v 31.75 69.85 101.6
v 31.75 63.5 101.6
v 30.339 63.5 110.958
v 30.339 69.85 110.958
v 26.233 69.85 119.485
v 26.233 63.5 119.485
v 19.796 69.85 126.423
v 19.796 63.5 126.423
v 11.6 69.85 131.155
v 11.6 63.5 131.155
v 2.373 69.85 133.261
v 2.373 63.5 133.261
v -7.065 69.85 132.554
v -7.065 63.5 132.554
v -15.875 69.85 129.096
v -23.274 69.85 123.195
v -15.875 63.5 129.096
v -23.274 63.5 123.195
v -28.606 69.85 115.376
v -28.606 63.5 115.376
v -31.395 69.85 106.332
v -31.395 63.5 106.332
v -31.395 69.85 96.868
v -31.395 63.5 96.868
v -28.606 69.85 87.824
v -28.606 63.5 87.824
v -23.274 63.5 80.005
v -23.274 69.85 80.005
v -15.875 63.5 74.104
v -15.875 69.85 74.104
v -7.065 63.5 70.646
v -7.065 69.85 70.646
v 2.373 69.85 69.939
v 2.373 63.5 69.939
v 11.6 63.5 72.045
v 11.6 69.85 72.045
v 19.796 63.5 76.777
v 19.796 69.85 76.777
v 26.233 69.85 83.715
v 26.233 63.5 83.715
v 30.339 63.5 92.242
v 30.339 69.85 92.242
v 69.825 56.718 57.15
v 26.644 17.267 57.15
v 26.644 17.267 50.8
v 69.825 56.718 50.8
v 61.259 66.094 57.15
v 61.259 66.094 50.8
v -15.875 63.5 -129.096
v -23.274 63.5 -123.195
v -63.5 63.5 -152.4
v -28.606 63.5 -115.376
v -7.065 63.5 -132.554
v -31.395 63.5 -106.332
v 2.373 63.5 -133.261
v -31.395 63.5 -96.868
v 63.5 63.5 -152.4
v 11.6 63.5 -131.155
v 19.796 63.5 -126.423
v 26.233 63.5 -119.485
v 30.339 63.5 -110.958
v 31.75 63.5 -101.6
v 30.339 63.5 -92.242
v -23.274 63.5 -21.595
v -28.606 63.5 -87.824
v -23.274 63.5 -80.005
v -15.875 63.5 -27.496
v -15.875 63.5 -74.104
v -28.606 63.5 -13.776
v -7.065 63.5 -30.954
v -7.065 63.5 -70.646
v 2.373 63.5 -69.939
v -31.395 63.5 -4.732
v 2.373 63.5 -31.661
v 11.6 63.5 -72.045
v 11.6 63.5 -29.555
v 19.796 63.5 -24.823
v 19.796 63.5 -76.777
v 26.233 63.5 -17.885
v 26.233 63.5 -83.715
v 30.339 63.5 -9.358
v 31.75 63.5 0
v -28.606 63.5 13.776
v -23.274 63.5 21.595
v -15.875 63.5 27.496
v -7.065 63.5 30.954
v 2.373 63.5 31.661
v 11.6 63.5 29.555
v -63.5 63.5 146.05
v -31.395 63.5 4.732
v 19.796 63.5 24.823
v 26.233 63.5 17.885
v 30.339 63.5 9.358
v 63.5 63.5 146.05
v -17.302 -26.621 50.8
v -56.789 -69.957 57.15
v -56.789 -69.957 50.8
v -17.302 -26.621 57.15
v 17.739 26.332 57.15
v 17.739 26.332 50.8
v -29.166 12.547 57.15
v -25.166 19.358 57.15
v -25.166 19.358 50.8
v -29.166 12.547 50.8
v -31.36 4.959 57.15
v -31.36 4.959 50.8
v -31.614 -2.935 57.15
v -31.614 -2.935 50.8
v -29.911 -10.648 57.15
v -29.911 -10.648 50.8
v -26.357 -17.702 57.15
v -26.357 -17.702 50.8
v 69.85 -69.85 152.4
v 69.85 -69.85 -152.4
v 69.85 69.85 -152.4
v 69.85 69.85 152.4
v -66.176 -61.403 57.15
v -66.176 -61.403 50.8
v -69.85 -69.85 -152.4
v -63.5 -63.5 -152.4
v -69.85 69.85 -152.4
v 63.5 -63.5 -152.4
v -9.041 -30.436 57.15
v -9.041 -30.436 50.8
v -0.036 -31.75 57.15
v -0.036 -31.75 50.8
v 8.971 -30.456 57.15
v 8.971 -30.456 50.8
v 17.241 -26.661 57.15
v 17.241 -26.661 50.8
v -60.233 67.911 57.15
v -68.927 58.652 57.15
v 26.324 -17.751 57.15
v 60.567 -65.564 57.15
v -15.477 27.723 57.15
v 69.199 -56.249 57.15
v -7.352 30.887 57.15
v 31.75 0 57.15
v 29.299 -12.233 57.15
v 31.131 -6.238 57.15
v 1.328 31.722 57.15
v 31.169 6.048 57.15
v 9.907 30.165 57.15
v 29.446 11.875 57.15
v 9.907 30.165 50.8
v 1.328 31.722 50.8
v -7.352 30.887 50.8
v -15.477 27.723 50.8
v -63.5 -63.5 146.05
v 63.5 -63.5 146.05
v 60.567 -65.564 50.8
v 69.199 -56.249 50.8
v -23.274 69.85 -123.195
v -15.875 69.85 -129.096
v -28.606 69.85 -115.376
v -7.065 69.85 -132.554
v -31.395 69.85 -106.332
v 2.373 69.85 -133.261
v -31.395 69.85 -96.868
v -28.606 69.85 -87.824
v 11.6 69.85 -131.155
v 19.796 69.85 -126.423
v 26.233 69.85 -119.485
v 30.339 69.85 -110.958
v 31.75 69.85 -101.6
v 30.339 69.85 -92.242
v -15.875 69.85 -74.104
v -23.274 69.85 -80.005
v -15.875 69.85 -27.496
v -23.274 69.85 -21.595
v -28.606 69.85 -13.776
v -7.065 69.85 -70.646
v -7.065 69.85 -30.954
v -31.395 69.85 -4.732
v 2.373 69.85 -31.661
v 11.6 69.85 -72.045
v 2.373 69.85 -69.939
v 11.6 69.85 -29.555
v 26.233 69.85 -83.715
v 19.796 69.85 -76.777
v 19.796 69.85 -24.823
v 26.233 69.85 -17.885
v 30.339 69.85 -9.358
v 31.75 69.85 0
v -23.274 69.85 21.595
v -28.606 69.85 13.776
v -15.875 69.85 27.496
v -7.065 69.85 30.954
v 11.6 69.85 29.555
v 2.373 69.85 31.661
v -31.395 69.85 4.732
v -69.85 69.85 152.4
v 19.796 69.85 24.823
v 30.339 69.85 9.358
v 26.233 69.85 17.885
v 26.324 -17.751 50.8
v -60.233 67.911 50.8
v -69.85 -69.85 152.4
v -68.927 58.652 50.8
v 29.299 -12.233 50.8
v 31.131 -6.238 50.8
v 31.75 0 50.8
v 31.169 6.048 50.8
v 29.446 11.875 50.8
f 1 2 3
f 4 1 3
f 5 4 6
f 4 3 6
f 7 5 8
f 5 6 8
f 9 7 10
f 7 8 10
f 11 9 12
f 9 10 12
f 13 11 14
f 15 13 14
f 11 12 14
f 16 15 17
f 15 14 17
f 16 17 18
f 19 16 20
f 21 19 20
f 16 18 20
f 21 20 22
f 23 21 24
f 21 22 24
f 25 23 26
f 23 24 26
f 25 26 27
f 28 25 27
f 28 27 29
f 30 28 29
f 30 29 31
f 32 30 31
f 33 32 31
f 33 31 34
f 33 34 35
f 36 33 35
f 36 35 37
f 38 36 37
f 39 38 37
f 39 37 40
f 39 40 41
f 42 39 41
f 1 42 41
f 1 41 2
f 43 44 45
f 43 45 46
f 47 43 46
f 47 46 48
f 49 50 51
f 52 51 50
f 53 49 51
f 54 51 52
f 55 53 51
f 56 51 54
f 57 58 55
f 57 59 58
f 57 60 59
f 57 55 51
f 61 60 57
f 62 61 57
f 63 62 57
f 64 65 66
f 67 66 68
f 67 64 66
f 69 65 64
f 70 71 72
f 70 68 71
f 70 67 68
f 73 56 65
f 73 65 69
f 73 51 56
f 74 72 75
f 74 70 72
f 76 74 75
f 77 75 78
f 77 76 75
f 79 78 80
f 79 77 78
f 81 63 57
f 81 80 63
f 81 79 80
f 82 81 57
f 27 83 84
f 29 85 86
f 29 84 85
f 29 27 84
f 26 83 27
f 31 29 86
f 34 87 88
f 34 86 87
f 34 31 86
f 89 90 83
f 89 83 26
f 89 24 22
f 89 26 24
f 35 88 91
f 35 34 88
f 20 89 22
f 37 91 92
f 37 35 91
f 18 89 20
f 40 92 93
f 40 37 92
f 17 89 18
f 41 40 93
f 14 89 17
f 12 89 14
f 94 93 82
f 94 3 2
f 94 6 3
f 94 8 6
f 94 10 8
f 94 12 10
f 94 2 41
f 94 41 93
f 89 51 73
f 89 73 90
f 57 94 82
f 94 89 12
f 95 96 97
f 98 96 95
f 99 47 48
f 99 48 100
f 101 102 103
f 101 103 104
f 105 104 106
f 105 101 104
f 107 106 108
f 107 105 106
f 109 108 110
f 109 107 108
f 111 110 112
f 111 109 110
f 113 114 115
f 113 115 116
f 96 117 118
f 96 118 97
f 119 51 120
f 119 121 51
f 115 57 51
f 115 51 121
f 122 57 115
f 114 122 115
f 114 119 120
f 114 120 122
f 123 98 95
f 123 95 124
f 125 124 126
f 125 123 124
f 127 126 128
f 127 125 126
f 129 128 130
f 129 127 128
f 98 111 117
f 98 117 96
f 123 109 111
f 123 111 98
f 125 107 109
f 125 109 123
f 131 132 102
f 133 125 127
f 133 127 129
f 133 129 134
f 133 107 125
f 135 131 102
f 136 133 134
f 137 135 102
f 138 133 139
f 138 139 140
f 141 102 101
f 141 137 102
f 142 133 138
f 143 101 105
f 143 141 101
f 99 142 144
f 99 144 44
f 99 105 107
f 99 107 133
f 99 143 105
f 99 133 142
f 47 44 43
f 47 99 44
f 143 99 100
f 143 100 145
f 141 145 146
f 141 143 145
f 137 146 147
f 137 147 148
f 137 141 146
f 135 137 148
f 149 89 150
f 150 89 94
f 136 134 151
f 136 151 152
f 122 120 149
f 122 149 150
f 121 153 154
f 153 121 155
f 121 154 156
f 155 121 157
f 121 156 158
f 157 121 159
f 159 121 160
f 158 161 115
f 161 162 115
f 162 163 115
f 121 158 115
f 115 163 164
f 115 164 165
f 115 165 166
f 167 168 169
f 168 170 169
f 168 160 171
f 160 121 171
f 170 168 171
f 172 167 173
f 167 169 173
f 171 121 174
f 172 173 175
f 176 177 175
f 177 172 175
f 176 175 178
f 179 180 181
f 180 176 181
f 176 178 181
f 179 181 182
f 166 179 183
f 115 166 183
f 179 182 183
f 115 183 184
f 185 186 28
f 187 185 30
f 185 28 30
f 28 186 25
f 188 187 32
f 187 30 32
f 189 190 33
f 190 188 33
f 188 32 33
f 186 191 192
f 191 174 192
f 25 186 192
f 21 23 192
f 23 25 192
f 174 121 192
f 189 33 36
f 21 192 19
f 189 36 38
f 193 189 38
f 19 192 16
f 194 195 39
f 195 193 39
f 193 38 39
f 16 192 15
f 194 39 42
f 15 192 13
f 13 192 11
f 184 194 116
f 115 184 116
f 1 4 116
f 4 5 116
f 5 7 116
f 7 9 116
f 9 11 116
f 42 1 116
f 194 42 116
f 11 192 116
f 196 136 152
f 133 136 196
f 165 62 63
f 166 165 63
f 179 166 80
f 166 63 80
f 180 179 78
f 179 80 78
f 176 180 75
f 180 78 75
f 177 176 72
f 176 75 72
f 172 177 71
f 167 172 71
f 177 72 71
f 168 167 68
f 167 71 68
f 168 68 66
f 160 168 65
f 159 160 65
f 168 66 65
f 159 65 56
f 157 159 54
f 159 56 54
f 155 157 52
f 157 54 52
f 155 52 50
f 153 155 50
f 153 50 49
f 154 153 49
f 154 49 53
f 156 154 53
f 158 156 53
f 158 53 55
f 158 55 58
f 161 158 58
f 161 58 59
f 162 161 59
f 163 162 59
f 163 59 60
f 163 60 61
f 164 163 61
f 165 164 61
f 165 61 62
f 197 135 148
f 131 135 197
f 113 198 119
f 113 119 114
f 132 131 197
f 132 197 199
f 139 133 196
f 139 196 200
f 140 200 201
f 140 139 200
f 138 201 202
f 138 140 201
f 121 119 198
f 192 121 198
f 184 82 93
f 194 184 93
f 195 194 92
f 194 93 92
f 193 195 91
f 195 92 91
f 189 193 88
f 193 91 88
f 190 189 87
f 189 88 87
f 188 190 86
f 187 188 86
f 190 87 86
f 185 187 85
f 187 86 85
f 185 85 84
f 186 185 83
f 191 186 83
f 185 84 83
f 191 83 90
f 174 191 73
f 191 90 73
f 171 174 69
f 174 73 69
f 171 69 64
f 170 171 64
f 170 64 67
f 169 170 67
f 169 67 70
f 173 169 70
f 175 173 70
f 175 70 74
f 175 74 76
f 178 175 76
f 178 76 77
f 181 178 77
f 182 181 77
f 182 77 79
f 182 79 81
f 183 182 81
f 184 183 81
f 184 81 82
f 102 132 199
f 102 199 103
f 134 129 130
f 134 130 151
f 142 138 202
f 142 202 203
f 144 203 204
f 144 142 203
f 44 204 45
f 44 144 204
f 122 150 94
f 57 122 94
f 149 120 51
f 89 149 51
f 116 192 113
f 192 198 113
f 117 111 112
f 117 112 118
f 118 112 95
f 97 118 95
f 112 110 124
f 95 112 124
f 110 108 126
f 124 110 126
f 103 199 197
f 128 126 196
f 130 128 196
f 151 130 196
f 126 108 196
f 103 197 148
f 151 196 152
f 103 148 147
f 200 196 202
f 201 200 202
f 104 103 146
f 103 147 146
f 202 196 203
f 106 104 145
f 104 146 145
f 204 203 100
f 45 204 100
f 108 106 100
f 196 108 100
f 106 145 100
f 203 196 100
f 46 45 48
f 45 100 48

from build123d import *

# Parameters (mm, degrees)
F0_W          = 139.7
F0_H          = 304.8
F1_DEPTH      = 69.85
F2_W          = 127
F2_H          = 127
F3_DEPTH      = 152.4
F3_DEPTH_BACK = 146.05
F4_R          = 31.75
F5_DEPTH      = 127
F8_DEPTH      = 6.35


with BuildPart() as f1:
    # F0 (on Front) → F1 (new body, symmetric)
    with BuildSketch(Plane.XZ):
        Rectangle(F0_W, F0_H)
    extrude(amount=F1_DEPTH, both=True)

    # F2 (on Top) → F3 (cut, two sides)
    with BuildSketch(Plane.XY) as f3_sk:
        Rectangle(F2_W, F2_H)
    extrude(amount=-F3_DEPTH, mode=Mode.SUBTRACT)
    extrude(f3_sk.sketch, amount=F3_DEPTH_BACK, mode=Mode.SUBTRACT)

    # F4 (on Front) → F5 (cut)
    with BuildSketch(Plane.XZ):
        Circle(F4_R)
        with Locations((0, 101.6)):
            Circle(F4_R)
        with Locations((0, -101.6)):
            Circle(F4_R)
    extrude(amount=-F5_DEPTH, mode=Mode.SUBTRACT)

    # F10 (on offset) → F11 (revolve, cut)
    with BuildSketch(Plane.XY.offset(44.45)):
        with BuildLine():
            Line((0, -6.35), (0, 0))
            Line((0, 0), (0, 6.35))
            ThreePointArc((0, 6.35), (-6.35, 0), (0, -6.35))
        make_face()
    revolve(axis=Axis((0, -3.175, 44.45), (0, -1, 0)), mode=Mode.SUBTRACT)


with BuildPart() as f8:
    # F7 (on offset) → F8 (new body)
    with BuildSketch(Plane.XY.offset(57.15)):
        with BuildLine():
            ThreePointArc((26.3244952978, -17.7505900554), (30.3633432424, -9.2806188989), (31.75, 0))
            ThreePointArc((31.75, 0), (30.446875694, 9.0027918155), (26.6444717812, 17.2665753264))
            Line((26.6444717812, 17.2665753264), (23.8826018393, 14.7432721863))
            Line((23.8826018393, 14.7432721863), (15.3164268655, 24.1193399291))
            Line((15.3164268655, 24.1193399291), (17.7387810505, 26.3324542502))
            ThreePointArc((17.7387810505, 26.3324542502), (1.3276009662, 31.7222315683), (-15.4765358755, 27.7225420425))
            Line((-15.4765358755, 27.7225420425), (-12.9853863034, 25.485682995))
            Line((-12.9853863034, 25.485682995), (-21.6787576449, 16.227427505))
            Line((-21.6787576449, 16.227427505), (-25.1657139179, 19.3584437133))
            ThreePointArc((-25.1657139179, 19.3584437133), (-31.7336135863, 1.0199356609), (-26.3568722235, -17.7024796736))
            Line((-26.3568722235, -17.7024796736), (-23.4076284828, -14.4657643103))
            Line((-23.4076284828, -14.4657643103), (-14.0201763565, -23.019461907))
            Line((-14.0201763565, -23.019461907), (-17.3021757576, -26.6213676218))
            ThreePointArc((-17.3021757576, -26.6213676218), (-0.0363207978, -31.7499792252), (17.2412228394, -26.6608839877))
            Line((17.2412228394, -26.6608839877), (15.2091812342, -24.836268276))
            Line((15.2091812342, -24.836268276), (23.8411927104, -15.5207769913))
            Line((23.8411927104, -15.5207769913), (26.3244952978, -17.7505900554))
        make_face()
        with BuildLine():
            Line((23.8826018393, 14.7432721863), (26.6444717812, 17.2665753264))
            ThreePointArc((26.6444717812, 17.2665753264), (22.6498526076, 22.2496444208), (17.7387810505, 26.3324542502))
            Line((17.7387810505, 26.3324542502), (15.3164268655, 24.1193399291))
            Line((15.3164268655, 24.1193399291), (23.8826018393, 14.7432721863))
        make_face()
        with BuildLine():
            ThreePointArc((17.7387810505, 26.3324542502), (22.6498526076, 22.2496444208), (26.6444717812, 17.2665753264))
            Line((26.6444717812, 17.2665753264), (69.8253337792, 56.7175295579))
            Line((69.8253337792, 56.7175295579), (61.2591588054, 66.0935973007))
            Line((61.2591588054, 66.0935973007), (17.7387810505, 26.3324542502))
        make_face()
        with BuildLine():
            Line((69.1992311576, -56.2487765521), (26.3244952978, -17.7505900554))
            ThreePointArc((26.3244952978, -17.7505900554), (22.233786985, -22.6654189528), (17.2412228394, -26.6608839877))
            Line((17.2412228394, -26.6608839877), (60.5672196814, -65.5642678368))
            Line((60.5672196814, -65.5642678368), (69.1992311576, -56.2487765521))
        make_face()
        with BuildLine():
            ThreePointArc((17.2412228394, -26.6608839877), (22.233786985, -22.6654189528), (26.3244952978, -17.7505900554))
            Line((26.3244952978, -17.7505900554), (23.8411927104, -15.5207769913))
            Line((23.8411927104, -15.5207769913), (15.2091812342, -24.836268276))
            Line((15.2091812342, -24.836268276), (17.2412228394, -26.6608839877))
        make_face()
        with BuildLine():
            Line((-12.9853863034, 25.485682995), (-15.4765358755, 27.7225420425))
            ThreePointArc((-15.4765358755, 27.7225420425), (-20.7469914031, 24.033827155), (-25.1657139179, 19.3584437133))
            Line((-25.1657139179, 19.3584437133), (-21.6787576449, 16.227427505))
            Line((-21.6787576449, 16.227427505), (-12.9853863034, 25.485682995))
        make_face()
        with BuildLine():
            ThreePointArc((-25.1657139179, 19.3584437133), (-20.7469914031, 24.033827155), (-15.4765358755, 27.7225420425))
            Line((-15.4765358755, 27.7225420425), (-60.2333430192, 67.9106825375))
            Line((-60.2333430192, 67.9106825375), (-68.9267143607, 58.6524270475))
            Line((-68.9267143607, 58.6524270475), (-25.1657139179, 19.3584437133))
        make_face()
        with BuildLine():
            Line((-56.7886643402, -69.9567225384), (-17.3021757576, -26.6213676218))
            ThreePointArc((-17.3021757576, -26.6213676218), (-22.2803671023, -22.6196317784), (-26.3568722235, -17.7024796736))
            Line((-26.3568722235, -17.7024796736), (-66.1761164665, -61.4030249417))
            Line((-66.1761164665, -61.4030249417), (-56.7886643402, -69.9567225384))
        make_face()
        with BuildLine():
            ThreePointArc((-26.3568722235, -17.7024796736), (-22.2803671023, -22.6196317784), (-17.3021757576, -26.6213676218))
            Line((-17.3021757576, -26.6213676218), (-14.0201763565, -23.019461907))
            Line((-14.0201763565, -23.019461907), (-23.4076284828, -14.4657643103))
            Line((-23.4076284828, -14.4657643103), (-26.3568722235, -17.7024796736))
        make_face()
    extrude(amount=-F8_DEPTH)


solid = Compound([f1.part, f8.part])
